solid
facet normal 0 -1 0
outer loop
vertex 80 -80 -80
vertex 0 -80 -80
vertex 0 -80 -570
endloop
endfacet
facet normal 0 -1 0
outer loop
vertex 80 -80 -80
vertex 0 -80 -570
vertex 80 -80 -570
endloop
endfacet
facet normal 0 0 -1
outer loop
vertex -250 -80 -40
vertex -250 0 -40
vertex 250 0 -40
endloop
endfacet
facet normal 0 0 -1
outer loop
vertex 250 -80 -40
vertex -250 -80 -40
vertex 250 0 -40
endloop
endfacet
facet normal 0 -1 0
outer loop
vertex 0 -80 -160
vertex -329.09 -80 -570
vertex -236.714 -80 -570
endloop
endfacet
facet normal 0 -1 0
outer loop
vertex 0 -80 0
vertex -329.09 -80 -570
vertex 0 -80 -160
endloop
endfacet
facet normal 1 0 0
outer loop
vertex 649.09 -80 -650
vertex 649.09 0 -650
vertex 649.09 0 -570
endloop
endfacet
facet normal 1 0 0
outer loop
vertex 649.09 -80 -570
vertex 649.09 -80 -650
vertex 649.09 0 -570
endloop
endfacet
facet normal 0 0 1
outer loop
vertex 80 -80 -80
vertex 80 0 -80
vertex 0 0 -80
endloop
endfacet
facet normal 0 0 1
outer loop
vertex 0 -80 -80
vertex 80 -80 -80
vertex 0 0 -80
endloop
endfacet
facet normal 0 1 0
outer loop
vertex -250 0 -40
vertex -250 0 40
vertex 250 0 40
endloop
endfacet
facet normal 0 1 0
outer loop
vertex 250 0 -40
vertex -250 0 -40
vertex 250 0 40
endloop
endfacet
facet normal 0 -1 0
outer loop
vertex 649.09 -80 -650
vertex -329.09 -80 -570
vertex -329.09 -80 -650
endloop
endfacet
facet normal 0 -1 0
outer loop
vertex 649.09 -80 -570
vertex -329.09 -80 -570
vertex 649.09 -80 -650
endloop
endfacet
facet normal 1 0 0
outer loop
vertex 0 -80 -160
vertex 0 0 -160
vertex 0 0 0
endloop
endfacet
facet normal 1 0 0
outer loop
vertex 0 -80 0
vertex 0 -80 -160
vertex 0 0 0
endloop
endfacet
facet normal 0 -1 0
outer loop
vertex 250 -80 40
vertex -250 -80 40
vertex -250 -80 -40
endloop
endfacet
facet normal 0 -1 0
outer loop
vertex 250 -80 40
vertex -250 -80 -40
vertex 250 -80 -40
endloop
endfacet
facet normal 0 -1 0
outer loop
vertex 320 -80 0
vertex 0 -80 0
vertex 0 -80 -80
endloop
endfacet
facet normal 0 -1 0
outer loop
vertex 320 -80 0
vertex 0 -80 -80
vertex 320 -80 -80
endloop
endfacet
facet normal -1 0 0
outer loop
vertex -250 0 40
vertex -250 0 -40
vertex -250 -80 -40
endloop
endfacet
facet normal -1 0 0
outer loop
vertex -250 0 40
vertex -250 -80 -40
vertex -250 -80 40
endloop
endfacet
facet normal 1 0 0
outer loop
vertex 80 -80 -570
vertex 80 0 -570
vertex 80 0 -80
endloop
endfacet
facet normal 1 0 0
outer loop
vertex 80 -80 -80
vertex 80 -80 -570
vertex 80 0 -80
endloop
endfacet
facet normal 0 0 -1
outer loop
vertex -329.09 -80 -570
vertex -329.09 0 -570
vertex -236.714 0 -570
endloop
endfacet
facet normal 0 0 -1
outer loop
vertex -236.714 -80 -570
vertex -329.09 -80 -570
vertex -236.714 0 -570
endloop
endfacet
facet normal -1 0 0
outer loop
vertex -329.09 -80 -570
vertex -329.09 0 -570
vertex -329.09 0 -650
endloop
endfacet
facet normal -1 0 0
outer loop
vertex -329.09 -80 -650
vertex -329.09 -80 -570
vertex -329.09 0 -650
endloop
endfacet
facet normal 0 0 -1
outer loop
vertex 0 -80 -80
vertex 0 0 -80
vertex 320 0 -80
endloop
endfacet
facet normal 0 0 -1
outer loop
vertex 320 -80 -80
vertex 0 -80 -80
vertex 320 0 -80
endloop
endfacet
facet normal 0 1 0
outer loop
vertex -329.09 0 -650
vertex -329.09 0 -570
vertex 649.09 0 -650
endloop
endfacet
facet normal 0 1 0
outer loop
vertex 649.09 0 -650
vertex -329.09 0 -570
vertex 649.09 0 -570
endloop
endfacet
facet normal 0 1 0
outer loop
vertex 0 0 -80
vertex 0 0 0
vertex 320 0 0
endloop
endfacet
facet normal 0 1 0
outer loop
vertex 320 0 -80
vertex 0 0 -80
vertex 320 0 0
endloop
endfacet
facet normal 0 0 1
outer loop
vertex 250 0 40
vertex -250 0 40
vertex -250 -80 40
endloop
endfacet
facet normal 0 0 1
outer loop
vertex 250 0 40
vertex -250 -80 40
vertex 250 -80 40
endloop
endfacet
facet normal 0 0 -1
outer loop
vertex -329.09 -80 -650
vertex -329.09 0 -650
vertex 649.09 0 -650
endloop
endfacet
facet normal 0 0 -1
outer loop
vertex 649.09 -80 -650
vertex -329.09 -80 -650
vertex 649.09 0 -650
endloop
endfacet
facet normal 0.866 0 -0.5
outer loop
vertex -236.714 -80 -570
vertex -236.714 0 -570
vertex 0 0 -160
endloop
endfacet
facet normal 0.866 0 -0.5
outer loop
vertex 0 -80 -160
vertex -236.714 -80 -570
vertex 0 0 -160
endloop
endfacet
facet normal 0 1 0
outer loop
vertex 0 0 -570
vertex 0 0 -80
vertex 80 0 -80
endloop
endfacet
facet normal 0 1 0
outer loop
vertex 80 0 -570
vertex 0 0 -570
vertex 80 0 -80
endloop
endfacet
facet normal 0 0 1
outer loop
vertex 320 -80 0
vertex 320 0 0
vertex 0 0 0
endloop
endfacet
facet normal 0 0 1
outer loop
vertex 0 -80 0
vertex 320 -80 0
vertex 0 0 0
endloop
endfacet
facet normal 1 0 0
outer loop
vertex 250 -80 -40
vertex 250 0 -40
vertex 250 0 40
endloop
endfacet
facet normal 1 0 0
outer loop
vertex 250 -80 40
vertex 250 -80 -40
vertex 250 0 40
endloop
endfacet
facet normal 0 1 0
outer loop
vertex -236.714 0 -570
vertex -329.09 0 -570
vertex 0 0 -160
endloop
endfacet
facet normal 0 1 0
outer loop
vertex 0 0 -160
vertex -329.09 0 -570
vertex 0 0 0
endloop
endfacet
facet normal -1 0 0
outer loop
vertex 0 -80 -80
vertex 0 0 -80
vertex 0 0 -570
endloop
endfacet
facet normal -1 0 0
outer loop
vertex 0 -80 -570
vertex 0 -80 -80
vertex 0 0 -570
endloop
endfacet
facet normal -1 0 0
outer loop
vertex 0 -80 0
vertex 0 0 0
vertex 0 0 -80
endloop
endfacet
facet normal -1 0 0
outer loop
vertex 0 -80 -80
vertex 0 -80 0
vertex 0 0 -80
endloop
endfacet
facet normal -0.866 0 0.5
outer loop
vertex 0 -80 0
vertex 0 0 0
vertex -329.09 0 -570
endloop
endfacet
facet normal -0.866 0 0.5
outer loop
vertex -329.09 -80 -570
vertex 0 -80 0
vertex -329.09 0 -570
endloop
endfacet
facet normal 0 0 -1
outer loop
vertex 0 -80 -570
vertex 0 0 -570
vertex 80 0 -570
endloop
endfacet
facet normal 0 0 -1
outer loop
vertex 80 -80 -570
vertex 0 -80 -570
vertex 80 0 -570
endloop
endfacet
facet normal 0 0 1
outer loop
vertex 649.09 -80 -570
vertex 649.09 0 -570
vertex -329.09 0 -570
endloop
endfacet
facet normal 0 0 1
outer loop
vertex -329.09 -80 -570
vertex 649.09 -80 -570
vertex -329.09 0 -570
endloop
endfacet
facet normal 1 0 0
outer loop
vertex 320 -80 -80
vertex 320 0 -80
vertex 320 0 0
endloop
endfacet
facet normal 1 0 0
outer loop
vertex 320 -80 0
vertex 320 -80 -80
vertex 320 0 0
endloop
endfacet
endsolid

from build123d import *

# Parameters (mm, degrees)
F0_W     = 500
F0_H     = 80
F1_DEPTH = 80
F3_DEPTH = 80
F4_DEPTH = 80
F5_DEPTH = 80
F6_DEPTH = 80


with BuildPart() as f1:
    # F0 (on Front) → F1 (new body)
    with BuildSketch(Plane.XZ):
        Rectangle(F0_W, F0_H)
    extrude(amount=F1_DEPTH)


with BuildPart() as f3:
    # F2 (on Front) → F3 (new body)
    with BuildSketch(Plane.XZ):
        Polygon((-236.71361, -570), (-329.089653, -570), (-329.089653, -650), (649.089653, -650), (649.089653, -570), (556.71361, -570), (320, -570), (240, -570), (80, -570), (0, -570), align=None)
    extrude(amount=F3_DEPTH)


with BuildPart() as f4:
    # F2 (on Front) → F4 (new body)
    with BuildSketch(Plane.XZ):
        Polygon((320, 0), (0, 0), (0, -80), (80, -80), (240, -80), (320, -80), align=None)
    extrude(amount=F4_DEPTH)


with BuildPart() as f5:
    # F2 (on Front) → F5 (new body)
    with BuildSketch(Plane.XZ):
        Polygon((80, -80), (0, -80), (0, -160), (0, -570), (80, -570), align=None)
    extrude(amount=F5_DEPTH)


with BuildPart() as f6:
    # F2 (on Front) → F6 (new body)
    with BuildSketch(Plane.XZ):
        Polygon((0, -80), (0, 0), (-329.089653, -570), (-236.71361, -570), (0, -160), align=None)
    extrude(amount=F6_DEPTH)


solid = Compound([f1.part, f3.part, f4.part, f5.part, f6.part])
